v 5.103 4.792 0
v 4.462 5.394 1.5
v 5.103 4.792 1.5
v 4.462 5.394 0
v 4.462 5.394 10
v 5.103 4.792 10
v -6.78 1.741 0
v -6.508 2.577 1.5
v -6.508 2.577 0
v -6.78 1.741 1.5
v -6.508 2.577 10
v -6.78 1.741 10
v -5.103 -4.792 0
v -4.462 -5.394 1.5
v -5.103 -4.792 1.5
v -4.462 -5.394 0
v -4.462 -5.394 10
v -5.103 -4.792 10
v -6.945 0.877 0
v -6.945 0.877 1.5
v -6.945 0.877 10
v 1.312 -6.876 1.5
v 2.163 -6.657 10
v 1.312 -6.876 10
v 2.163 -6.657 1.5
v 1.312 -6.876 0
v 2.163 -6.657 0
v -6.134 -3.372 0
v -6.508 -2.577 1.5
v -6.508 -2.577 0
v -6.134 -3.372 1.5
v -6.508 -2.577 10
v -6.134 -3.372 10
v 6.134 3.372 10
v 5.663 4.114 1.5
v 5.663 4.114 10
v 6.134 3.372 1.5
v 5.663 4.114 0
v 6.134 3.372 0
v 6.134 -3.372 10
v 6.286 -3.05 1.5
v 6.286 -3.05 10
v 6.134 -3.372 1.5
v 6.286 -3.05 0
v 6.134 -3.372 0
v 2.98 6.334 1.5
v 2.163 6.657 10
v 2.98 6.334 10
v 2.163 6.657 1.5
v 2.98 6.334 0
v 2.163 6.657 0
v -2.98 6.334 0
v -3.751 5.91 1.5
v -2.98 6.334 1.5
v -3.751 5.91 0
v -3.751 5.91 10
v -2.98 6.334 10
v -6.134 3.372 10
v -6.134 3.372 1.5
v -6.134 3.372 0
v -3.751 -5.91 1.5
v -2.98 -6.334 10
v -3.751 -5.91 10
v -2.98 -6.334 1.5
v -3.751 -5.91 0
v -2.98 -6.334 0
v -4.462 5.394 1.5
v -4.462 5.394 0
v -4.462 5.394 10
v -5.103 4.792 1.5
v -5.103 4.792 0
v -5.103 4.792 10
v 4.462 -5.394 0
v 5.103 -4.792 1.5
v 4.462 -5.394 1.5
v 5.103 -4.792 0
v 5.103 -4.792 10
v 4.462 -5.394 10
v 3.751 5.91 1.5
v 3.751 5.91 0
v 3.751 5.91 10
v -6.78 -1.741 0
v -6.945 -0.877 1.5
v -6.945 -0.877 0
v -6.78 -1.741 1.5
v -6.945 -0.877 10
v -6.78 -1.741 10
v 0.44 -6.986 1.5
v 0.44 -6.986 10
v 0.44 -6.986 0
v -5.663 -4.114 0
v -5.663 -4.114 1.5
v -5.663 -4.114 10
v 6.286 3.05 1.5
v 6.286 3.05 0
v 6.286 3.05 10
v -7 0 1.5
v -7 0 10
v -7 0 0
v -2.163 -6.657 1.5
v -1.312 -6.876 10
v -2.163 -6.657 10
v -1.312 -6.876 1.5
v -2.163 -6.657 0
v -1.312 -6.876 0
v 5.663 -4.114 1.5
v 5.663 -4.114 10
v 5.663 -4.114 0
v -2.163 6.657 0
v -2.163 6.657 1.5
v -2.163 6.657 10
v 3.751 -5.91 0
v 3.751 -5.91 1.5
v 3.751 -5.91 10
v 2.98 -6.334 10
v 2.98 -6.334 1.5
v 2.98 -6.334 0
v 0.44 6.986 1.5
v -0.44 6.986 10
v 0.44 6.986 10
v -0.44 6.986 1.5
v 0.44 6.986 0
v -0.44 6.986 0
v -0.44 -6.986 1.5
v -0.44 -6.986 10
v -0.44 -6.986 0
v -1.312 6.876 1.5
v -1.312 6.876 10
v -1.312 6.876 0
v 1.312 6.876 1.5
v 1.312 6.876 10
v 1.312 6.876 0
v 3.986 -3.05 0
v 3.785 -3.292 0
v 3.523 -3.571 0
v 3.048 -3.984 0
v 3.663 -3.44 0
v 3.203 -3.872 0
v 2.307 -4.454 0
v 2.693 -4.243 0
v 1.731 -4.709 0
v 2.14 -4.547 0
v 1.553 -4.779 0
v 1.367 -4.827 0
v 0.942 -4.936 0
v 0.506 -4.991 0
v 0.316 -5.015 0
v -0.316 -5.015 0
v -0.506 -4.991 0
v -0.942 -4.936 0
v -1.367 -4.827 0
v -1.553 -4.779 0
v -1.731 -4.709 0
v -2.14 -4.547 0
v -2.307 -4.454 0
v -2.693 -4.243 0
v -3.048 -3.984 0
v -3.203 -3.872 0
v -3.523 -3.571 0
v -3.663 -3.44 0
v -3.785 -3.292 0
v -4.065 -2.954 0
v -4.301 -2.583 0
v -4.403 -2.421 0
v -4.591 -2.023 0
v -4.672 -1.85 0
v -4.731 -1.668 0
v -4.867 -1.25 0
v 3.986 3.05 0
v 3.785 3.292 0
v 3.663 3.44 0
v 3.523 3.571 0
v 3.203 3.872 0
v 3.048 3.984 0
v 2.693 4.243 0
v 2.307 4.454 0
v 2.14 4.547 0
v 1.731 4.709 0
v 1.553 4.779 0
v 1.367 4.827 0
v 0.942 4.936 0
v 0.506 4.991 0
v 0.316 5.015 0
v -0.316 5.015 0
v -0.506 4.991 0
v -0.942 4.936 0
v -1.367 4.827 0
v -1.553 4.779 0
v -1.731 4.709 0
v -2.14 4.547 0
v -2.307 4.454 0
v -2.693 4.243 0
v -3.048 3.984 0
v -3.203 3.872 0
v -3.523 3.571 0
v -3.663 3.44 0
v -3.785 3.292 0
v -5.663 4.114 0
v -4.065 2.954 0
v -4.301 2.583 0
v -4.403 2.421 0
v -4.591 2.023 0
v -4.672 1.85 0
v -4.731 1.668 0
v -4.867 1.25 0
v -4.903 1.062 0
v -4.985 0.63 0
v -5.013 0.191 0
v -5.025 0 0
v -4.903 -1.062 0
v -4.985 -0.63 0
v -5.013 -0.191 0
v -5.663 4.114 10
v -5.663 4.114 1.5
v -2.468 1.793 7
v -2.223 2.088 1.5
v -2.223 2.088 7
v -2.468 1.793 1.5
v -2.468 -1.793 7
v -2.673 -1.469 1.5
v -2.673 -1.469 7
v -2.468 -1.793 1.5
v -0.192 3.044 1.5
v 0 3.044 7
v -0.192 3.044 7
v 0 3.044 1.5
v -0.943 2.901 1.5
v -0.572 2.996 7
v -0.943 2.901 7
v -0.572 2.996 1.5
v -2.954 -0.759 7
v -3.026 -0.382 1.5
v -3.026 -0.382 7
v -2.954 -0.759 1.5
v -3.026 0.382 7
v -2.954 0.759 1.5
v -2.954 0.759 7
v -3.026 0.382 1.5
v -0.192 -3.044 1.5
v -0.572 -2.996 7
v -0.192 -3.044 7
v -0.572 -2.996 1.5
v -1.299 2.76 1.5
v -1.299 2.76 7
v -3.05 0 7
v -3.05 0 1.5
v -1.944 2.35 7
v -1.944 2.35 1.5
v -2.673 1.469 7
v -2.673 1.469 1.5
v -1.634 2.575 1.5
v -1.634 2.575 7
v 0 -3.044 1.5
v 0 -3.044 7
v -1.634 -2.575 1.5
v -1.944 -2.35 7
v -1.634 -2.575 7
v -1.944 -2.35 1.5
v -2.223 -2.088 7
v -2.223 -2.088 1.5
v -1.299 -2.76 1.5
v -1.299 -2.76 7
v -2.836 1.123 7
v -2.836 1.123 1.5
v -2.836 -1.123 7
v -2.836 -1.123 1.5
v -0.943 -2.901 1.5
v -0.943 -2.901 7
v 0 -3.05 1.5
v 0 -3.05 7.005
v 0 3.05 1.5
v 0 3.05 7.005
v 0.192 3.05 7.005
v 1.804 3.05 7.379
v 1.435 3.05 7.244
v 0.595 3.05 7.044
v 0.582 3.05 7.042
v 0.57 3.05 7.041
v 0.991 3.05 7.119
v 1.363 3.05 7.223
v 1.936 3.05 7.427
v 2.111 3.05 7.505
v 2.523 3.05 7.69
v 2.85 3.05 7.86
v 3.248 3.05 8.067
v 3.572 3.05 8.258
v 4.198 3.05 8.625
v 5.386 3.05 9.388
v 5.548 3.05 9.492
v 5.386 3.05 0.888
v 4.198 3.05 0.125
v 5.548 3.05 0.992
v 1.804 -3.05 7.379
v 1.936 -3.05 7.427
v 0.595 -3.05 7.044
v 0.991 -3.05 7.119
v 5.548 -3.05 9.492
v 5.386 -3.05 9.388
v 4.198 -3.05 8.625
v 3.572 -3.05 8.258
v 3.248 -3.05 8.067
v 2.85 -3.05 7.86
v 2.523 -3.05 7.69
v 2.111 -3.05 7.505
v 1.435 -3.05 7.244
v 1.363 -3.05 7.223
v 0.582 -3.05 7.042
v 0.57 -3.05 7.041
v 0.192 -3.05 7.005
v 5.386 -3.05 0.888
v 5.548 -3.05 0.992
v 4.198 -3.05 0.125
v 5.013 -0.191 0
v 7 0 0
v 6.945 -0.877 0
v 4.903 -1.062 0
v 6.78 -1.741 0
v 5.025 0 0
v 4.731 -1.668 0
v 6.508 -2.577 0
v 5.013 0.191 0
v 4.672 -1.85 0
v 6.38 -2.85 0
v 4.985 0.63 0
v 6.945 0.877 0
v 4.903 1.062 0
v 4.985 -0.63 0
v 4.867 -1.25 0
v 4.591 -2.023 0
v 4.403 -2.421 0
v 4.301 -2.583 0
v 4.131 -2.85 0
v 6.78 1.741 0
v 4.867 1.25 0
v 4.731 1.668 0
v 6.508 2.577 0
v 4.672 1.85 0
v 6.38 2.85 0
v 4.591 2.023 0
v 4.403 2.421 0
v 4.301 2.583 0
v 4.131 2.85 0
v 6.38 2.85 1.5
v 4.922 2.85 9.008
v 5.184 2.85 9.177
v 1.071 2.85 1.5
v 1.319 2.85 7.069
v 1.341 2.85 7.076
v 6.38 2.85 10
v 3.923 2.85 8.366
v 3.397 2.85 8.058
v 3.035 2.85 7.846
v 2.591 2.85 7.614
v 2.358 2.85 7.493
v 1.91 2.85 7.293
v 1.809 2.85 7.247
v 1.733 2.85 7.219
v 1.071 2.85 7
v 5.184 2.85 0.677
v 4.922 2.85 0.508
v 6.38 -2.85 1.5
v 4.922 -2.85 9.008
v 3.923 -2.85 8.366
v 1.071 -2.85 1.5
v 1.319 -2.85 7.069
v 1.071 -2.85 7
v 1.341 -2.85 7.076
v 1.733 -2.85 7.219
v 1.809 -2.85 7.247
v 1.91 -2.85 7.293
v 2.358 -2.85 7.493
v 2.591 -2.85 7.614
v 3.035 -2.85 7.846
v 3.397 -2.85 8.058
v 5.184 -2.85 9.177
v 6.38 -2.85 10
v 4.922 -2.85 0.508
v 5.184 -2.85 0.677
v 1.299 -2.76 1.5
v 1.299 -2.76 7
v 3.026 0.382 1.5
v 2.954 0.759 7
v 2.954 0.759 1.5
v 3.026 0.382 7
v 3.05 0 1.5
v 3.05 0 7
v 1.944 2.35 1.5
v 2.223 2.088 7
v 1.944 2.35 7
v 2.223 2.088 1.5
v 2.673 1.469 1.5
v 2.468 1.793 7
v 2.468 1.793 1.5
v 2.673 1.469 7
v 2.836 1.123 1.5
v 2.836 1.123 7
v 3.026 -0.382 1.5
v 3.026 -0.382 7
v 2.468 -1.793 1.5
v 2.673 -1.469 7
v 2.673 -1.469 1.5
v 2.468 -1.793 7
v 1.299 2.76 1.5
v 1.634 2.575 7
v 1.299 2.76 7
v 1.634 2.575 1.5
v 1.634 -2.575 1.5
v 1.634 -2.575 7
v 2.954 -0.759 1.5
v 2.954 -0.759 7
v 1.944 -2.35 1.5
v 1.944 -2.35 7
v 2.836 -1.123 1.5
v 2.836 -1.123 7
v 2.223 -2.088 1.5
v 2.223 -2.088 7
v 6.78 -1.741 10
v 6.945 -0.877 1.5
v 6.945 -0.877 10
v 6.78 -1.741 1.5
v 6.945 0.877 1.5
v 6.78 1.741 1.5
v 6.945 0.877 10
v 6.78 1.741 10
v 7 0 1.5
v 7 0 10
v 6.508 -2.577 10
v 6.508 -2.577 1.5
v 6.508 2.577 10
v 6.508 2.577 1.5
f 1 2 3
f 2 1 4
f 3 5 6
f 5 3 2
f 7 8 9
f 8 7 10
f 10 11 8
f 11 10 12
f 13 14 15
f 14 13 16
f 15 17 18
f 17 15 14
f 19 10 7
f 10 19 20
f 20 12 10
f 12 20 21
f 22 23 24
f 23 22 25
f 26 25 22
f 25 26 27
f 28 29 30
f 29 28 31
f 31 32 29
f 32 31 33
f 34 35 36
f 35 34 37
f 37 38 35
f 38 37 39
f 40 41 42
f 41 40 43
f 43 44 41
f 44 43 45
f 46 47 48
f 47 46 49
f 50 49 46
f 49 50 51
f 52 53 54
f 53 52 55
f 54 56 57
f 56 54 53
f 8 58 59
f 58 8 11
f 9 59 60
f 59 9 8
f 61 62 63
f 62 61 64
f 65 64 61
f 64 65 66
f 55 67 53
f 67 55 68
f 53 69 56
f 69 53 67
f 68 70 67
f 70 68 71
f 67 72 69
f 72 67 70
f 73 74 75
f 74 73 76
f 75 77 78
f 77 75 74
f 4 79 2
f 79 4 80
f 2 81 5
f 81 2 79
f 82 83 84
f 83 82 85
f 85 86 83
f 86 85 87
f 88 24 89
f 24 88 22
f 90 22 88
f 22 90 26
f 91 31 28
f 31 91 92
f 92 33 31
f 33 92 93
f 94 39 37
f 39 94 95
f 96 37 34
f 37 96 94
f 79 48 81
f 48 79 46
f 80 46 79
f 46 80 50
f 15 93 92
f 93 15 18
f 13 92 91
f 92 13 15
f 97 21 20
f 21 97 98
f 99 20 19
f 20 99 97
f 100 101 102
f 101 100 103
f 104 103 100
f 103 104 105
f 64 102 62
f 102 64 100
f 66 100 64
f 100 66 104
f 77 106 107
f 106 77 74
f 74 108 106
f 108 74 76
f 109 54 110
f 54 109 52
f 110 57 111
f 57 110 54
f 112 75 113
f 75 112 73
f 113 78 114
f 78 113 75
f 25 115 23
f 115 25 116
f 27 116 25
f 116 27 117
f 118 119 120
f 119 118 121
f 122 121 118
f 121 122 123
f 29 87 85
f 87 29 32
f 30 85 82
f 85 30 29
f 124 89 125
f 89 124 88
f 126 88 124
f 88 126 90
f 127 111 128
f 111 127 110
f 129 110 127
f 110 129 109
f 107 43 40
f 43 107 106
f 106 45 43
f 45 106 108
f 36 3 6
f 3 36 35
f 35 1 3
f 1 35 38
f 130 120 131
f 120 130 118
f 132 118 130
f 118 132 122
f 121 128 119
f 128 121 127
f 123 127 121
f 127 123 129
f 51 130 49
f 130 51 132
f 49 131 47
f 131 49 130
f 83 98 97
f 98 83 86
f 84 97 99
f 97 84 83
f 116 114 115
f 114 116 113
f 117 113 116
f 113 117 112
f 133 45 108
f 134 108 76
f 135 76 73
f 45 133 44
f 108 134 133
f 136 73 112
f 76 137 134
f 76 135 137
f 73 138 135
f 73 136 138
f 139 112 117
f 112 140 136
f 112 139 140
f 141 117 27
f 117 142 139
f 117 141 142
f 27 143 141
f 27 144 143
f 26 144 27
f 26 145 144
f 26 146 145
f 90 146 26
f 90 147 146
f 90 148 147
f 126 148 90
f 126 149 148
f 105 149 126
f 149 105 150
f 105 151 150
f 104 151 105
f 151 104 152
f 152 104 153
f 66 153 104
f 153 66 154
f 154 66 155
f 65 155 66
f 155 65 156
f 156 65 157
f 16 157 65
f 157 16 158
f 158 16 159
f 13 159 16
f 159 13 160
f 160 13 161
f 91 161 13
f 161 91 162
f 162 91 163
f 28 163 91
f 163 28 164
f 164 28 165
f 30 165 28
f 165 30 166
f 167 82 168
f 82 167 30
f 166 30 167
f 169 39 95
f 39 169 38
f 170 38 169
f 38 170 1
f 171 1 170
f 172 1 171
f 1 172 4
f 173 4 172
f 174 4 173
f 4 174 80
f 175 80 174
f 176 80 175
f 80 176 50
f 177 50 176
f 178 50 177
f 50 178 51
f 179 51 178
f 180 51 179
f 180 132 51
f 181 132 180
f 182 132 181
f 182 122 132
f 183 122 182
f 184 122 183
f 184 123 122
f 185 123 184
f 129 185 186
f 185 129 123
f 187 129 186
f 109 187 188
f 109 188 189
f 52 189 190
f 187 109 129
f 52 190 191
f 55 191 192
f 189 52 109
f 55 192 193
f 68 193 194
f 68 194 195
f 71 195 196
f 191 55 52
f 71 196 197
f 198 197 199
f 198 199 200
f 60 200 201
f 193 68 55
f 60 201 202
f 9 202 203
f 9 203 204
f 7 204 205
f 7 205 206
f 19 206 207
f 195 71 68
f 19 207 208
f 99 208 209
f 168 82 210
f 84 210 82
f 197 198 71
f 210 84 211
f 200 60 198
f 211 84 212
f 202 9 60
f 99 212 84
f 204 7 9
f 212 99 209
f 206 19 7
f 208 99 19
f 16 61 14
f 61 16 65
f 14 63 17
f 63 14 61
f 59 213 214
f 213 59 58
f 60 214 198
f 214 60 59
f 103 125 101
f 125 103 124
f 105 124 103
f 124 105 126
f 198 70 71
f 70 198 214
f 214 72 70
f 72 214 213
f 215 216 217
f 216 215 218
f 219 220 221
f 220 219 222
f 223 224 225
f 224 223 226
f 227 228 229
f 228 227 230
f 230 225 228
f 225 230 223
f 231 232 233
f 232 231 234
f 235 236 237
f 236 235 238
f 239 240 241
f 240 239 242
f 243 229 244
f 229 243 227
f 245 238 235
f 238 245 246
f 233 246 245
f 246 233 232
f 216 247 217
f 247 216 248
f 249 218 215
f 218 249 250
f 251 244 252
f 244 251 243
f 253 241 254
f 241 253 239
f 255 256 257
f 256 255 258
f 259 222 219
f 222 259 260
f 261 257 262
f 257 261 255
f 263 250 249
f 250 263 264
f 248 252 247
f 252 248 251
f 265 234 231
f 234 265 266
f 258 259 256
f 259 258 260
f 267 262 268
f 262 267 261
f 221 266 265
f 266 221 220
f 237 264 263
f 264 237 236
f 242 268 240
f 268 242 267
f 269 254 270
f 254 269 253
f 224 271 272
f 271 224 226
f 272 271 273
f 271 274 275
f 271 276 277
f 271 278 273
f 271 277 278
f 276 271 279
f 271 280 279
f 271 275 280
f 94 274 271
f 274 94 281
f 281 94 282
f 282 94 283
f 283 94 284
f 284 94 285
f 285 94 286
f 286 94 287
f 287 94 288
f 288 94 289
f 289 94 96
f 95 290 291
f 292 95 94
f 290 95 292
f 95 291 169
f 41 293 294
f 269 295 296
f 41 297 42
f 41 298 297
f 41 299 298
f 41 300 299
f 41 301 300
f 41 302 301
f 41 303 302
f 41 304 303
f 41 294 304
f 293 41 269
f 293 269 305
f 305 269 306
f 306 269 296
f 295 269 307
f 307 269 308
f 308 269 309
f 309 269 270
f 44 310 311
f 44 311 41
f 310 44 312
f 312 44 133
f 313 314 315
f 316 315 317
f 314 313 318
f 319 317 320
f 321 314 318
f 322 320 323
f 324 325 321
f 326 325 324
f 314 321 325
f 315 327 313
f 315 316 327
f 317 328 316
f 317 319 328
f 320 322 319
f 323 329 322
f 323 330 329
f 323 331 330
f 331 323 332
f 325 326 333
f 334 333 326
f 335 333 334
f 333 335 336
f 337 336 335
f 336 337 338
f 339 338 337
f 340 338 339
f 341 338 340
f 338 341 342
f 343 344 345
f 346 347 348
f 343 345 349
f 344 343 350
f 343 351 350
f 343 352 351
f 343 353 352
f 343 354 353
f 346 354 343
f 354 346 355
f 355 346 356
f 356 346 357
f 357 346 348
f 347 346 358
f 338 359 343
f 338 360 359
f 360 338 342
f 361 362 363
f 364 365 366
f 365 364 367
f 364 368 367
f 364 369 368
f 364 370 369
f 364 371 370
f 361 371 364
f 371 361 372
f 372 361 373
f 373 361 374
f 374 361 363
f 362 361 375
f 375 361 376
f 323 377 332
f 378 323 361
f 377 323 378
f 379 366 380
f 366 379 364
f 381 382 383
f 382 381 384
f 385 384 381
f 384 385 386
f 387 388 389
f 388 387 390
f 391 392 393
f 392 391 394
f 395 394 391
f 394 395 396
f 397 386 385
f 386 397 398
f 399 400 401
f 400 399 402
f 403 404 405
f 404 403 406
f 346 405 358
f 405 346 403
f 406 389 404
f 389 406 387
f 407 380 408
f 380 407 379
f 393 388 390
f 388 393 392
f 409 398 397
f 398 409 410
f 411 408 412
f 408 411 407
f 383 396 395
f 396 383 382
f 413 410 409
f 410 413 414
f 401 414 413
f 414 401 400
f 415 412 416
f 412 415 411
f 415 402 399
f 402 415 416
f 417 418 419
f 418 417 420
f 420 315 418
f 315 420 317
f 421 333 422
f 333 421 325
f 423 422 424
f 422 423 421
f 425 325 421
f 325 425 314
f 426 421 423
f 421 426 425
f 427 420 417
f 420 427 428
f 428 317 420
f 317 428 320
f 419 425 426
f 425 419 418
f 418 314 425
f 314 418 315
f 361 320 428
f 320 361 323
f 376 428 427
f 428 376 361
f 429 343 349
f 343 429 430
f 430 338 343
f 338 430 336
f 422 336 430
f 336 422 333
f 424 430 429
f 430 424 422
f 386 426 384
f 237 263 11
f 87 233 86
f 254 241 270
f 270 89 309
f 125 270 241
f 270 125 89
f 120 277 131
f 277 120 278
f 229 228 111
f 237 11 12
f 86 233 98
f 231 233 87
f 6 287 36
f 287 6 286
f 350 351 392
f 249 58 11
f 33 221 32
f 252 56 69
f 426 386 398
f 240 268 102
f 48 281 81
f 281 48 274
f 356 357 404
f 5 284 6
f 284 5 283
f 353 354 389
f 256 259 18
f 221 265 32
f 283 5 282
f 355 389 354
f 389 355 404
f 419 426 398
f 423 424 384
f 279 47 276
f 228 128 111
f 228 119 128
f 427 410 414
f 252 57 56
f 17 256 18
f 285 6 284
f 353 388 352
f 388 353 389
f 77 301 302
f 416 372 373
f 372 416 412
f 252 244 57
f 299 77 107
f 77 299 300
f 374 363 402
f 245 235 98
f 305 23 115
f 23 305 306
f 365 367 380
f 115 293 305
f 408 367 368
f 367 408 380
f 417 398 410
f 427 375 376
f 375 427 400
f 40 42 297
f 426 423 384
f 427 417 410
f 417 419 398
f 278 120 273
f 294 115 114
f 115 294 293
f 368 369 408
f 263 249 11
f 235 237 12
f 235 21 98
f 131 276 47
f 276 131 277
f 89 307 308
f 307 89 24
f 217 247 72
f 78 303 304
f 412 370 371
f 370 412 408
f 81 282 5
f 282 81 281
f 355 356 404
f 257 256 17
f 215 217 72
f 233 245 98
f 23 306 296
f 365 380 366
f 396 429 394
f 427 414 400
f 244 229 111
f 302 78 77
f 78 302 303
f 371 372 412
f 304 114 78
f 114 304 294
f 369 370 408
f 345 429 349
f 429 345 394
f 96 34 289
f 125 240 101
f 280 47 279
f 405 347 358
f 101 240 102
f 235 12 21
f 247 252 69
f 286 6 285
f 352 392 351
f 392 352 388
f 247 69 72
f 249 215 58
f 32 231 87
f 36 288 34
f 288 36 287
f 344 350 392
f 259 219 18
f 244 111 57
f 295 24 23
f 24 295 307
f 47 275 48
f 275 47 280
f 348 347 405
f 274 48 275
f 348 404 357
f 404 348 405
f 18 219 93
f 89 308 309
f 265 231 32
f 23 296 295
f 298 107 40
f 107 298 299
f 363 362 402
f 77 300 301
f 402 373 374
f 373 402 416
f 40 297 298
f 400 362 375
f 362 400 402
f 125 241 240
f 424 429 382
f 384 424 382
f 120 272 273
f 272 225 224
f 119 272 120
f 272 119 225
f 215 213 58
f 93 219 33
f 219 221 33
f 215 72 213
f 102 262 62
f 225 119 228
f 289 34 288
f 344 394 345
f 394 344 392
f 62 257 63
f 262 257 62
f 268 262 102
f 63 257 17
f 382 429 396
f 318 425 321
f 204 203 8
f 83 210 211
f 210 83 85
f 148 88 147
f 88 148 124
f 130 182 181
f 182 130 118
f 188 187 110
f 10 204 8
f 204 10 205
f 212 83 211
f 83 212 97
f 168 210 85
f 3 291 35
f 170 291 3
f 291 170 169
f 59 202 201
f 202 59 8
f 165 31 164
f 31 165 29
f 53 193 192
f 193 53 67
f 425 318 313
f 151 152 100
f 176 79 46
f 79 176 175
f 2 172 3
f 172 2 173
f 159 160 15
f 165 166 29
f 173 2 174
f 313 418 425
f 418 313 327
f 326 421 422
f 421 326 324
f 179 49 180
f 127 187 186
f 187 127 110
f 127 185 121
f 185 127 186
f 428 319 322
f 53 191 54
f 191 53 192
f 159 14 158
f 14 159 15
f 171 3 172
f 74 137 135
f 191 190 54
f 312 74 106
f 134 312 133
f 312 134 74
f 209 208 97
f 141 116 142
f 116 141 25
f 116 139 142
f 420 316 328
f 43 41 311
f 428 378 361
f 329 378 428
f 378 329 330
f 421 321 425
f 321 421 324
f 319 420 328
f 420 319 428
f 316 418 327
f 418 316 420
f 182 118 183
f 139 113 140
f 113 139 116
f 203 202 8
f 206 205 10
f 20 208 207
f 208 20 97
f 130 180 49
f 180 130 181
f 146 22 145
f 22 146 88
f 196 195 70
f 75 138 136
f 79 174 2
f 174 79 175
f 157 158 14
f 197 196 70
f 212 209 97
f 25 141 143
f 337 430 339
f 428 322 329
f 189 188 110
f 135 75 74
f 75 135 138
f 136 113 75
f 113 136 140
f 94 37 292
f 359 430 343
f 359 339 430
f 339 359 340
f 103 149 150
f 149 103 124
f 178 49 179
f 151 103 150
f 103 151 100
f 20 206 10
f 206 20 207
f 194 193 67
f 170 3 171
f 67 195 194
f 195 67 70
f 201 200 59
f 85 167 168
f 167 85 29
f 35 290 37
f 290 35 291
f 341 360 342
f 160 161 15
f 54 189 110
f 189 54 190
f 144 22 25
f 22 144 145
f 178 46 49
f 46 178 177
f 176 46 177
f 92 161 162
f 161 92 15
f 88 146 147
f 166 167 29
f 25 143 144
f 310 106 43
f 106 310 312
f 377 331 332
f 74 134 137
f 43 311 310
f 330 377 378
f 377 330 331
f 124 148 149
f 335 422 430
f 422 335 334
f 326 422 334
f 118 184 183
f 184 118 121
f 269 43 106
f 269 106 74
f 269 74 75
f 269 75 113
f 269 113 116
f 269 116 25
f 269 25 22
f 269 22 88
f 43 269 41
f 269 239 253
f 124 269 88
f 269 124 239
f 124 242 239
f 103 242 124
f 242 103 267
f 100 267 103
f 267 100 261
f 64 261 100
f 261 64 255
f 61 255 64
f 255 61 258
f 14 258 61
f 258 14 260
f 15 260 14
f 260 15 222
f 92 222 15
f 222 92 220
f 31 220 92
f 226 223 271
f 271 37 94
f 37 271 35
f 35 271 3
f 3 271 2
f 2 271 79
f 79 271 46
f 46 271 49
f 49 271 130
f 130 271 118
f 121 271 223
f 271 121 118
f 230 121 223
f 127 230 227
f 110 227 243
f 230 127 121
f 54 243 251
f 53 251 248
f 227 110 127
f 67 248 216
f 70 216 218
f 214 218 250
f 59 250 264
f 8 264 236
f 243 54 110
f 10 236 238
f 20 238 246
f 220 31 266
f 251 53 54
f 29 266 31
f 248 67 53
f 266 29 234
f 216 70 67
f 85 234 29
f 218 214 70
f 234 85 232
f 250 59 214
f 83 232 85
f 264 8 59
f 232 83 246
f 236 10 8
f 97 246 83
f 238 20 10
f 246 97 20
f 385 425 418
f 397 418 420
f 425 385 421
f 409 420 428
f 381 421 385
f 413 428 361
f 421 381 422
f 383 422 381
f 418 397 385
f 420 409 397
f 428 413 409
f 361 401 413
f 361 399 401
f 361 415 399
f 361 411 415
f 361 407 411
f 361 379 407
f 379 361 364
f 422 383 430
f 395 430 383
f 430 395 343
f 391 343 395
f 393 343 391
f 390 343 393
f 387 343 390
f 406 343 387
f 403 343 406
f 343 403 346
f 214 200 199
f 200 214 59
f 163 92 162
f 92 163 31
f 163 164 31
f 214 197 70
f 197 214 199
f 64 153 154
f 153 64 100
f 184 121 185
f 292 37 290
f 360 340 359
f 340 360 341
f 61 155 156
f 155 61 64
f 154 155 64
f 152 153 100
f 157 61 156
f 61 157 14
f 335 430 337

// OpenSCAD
d1=6.1;
d2=14;
$fn = 50;

difference(){

union() {
    difference(){
      cylinder(d=d2, h=10);
      cylinder(d=d1, h=10);
      translate([0,-d1/2, 0]) cube([d2,d1, 10]);
    }


    intersection(){
        cylinder(d=d2, h=10);
        difference(){
          translate([0,-d1/2+0.2, 0]) cube([d2,d1-0.4, 10]);
          cylinder(d=d1, h=10);
        }
    }

}

union(){
    translate([0,0,10-1.5])
    cylinder(h=3, d1=d1, d2=d2, center=true);
    
    cylinder(h=3, d1=d1, d2=d2, center=true);
}

}
